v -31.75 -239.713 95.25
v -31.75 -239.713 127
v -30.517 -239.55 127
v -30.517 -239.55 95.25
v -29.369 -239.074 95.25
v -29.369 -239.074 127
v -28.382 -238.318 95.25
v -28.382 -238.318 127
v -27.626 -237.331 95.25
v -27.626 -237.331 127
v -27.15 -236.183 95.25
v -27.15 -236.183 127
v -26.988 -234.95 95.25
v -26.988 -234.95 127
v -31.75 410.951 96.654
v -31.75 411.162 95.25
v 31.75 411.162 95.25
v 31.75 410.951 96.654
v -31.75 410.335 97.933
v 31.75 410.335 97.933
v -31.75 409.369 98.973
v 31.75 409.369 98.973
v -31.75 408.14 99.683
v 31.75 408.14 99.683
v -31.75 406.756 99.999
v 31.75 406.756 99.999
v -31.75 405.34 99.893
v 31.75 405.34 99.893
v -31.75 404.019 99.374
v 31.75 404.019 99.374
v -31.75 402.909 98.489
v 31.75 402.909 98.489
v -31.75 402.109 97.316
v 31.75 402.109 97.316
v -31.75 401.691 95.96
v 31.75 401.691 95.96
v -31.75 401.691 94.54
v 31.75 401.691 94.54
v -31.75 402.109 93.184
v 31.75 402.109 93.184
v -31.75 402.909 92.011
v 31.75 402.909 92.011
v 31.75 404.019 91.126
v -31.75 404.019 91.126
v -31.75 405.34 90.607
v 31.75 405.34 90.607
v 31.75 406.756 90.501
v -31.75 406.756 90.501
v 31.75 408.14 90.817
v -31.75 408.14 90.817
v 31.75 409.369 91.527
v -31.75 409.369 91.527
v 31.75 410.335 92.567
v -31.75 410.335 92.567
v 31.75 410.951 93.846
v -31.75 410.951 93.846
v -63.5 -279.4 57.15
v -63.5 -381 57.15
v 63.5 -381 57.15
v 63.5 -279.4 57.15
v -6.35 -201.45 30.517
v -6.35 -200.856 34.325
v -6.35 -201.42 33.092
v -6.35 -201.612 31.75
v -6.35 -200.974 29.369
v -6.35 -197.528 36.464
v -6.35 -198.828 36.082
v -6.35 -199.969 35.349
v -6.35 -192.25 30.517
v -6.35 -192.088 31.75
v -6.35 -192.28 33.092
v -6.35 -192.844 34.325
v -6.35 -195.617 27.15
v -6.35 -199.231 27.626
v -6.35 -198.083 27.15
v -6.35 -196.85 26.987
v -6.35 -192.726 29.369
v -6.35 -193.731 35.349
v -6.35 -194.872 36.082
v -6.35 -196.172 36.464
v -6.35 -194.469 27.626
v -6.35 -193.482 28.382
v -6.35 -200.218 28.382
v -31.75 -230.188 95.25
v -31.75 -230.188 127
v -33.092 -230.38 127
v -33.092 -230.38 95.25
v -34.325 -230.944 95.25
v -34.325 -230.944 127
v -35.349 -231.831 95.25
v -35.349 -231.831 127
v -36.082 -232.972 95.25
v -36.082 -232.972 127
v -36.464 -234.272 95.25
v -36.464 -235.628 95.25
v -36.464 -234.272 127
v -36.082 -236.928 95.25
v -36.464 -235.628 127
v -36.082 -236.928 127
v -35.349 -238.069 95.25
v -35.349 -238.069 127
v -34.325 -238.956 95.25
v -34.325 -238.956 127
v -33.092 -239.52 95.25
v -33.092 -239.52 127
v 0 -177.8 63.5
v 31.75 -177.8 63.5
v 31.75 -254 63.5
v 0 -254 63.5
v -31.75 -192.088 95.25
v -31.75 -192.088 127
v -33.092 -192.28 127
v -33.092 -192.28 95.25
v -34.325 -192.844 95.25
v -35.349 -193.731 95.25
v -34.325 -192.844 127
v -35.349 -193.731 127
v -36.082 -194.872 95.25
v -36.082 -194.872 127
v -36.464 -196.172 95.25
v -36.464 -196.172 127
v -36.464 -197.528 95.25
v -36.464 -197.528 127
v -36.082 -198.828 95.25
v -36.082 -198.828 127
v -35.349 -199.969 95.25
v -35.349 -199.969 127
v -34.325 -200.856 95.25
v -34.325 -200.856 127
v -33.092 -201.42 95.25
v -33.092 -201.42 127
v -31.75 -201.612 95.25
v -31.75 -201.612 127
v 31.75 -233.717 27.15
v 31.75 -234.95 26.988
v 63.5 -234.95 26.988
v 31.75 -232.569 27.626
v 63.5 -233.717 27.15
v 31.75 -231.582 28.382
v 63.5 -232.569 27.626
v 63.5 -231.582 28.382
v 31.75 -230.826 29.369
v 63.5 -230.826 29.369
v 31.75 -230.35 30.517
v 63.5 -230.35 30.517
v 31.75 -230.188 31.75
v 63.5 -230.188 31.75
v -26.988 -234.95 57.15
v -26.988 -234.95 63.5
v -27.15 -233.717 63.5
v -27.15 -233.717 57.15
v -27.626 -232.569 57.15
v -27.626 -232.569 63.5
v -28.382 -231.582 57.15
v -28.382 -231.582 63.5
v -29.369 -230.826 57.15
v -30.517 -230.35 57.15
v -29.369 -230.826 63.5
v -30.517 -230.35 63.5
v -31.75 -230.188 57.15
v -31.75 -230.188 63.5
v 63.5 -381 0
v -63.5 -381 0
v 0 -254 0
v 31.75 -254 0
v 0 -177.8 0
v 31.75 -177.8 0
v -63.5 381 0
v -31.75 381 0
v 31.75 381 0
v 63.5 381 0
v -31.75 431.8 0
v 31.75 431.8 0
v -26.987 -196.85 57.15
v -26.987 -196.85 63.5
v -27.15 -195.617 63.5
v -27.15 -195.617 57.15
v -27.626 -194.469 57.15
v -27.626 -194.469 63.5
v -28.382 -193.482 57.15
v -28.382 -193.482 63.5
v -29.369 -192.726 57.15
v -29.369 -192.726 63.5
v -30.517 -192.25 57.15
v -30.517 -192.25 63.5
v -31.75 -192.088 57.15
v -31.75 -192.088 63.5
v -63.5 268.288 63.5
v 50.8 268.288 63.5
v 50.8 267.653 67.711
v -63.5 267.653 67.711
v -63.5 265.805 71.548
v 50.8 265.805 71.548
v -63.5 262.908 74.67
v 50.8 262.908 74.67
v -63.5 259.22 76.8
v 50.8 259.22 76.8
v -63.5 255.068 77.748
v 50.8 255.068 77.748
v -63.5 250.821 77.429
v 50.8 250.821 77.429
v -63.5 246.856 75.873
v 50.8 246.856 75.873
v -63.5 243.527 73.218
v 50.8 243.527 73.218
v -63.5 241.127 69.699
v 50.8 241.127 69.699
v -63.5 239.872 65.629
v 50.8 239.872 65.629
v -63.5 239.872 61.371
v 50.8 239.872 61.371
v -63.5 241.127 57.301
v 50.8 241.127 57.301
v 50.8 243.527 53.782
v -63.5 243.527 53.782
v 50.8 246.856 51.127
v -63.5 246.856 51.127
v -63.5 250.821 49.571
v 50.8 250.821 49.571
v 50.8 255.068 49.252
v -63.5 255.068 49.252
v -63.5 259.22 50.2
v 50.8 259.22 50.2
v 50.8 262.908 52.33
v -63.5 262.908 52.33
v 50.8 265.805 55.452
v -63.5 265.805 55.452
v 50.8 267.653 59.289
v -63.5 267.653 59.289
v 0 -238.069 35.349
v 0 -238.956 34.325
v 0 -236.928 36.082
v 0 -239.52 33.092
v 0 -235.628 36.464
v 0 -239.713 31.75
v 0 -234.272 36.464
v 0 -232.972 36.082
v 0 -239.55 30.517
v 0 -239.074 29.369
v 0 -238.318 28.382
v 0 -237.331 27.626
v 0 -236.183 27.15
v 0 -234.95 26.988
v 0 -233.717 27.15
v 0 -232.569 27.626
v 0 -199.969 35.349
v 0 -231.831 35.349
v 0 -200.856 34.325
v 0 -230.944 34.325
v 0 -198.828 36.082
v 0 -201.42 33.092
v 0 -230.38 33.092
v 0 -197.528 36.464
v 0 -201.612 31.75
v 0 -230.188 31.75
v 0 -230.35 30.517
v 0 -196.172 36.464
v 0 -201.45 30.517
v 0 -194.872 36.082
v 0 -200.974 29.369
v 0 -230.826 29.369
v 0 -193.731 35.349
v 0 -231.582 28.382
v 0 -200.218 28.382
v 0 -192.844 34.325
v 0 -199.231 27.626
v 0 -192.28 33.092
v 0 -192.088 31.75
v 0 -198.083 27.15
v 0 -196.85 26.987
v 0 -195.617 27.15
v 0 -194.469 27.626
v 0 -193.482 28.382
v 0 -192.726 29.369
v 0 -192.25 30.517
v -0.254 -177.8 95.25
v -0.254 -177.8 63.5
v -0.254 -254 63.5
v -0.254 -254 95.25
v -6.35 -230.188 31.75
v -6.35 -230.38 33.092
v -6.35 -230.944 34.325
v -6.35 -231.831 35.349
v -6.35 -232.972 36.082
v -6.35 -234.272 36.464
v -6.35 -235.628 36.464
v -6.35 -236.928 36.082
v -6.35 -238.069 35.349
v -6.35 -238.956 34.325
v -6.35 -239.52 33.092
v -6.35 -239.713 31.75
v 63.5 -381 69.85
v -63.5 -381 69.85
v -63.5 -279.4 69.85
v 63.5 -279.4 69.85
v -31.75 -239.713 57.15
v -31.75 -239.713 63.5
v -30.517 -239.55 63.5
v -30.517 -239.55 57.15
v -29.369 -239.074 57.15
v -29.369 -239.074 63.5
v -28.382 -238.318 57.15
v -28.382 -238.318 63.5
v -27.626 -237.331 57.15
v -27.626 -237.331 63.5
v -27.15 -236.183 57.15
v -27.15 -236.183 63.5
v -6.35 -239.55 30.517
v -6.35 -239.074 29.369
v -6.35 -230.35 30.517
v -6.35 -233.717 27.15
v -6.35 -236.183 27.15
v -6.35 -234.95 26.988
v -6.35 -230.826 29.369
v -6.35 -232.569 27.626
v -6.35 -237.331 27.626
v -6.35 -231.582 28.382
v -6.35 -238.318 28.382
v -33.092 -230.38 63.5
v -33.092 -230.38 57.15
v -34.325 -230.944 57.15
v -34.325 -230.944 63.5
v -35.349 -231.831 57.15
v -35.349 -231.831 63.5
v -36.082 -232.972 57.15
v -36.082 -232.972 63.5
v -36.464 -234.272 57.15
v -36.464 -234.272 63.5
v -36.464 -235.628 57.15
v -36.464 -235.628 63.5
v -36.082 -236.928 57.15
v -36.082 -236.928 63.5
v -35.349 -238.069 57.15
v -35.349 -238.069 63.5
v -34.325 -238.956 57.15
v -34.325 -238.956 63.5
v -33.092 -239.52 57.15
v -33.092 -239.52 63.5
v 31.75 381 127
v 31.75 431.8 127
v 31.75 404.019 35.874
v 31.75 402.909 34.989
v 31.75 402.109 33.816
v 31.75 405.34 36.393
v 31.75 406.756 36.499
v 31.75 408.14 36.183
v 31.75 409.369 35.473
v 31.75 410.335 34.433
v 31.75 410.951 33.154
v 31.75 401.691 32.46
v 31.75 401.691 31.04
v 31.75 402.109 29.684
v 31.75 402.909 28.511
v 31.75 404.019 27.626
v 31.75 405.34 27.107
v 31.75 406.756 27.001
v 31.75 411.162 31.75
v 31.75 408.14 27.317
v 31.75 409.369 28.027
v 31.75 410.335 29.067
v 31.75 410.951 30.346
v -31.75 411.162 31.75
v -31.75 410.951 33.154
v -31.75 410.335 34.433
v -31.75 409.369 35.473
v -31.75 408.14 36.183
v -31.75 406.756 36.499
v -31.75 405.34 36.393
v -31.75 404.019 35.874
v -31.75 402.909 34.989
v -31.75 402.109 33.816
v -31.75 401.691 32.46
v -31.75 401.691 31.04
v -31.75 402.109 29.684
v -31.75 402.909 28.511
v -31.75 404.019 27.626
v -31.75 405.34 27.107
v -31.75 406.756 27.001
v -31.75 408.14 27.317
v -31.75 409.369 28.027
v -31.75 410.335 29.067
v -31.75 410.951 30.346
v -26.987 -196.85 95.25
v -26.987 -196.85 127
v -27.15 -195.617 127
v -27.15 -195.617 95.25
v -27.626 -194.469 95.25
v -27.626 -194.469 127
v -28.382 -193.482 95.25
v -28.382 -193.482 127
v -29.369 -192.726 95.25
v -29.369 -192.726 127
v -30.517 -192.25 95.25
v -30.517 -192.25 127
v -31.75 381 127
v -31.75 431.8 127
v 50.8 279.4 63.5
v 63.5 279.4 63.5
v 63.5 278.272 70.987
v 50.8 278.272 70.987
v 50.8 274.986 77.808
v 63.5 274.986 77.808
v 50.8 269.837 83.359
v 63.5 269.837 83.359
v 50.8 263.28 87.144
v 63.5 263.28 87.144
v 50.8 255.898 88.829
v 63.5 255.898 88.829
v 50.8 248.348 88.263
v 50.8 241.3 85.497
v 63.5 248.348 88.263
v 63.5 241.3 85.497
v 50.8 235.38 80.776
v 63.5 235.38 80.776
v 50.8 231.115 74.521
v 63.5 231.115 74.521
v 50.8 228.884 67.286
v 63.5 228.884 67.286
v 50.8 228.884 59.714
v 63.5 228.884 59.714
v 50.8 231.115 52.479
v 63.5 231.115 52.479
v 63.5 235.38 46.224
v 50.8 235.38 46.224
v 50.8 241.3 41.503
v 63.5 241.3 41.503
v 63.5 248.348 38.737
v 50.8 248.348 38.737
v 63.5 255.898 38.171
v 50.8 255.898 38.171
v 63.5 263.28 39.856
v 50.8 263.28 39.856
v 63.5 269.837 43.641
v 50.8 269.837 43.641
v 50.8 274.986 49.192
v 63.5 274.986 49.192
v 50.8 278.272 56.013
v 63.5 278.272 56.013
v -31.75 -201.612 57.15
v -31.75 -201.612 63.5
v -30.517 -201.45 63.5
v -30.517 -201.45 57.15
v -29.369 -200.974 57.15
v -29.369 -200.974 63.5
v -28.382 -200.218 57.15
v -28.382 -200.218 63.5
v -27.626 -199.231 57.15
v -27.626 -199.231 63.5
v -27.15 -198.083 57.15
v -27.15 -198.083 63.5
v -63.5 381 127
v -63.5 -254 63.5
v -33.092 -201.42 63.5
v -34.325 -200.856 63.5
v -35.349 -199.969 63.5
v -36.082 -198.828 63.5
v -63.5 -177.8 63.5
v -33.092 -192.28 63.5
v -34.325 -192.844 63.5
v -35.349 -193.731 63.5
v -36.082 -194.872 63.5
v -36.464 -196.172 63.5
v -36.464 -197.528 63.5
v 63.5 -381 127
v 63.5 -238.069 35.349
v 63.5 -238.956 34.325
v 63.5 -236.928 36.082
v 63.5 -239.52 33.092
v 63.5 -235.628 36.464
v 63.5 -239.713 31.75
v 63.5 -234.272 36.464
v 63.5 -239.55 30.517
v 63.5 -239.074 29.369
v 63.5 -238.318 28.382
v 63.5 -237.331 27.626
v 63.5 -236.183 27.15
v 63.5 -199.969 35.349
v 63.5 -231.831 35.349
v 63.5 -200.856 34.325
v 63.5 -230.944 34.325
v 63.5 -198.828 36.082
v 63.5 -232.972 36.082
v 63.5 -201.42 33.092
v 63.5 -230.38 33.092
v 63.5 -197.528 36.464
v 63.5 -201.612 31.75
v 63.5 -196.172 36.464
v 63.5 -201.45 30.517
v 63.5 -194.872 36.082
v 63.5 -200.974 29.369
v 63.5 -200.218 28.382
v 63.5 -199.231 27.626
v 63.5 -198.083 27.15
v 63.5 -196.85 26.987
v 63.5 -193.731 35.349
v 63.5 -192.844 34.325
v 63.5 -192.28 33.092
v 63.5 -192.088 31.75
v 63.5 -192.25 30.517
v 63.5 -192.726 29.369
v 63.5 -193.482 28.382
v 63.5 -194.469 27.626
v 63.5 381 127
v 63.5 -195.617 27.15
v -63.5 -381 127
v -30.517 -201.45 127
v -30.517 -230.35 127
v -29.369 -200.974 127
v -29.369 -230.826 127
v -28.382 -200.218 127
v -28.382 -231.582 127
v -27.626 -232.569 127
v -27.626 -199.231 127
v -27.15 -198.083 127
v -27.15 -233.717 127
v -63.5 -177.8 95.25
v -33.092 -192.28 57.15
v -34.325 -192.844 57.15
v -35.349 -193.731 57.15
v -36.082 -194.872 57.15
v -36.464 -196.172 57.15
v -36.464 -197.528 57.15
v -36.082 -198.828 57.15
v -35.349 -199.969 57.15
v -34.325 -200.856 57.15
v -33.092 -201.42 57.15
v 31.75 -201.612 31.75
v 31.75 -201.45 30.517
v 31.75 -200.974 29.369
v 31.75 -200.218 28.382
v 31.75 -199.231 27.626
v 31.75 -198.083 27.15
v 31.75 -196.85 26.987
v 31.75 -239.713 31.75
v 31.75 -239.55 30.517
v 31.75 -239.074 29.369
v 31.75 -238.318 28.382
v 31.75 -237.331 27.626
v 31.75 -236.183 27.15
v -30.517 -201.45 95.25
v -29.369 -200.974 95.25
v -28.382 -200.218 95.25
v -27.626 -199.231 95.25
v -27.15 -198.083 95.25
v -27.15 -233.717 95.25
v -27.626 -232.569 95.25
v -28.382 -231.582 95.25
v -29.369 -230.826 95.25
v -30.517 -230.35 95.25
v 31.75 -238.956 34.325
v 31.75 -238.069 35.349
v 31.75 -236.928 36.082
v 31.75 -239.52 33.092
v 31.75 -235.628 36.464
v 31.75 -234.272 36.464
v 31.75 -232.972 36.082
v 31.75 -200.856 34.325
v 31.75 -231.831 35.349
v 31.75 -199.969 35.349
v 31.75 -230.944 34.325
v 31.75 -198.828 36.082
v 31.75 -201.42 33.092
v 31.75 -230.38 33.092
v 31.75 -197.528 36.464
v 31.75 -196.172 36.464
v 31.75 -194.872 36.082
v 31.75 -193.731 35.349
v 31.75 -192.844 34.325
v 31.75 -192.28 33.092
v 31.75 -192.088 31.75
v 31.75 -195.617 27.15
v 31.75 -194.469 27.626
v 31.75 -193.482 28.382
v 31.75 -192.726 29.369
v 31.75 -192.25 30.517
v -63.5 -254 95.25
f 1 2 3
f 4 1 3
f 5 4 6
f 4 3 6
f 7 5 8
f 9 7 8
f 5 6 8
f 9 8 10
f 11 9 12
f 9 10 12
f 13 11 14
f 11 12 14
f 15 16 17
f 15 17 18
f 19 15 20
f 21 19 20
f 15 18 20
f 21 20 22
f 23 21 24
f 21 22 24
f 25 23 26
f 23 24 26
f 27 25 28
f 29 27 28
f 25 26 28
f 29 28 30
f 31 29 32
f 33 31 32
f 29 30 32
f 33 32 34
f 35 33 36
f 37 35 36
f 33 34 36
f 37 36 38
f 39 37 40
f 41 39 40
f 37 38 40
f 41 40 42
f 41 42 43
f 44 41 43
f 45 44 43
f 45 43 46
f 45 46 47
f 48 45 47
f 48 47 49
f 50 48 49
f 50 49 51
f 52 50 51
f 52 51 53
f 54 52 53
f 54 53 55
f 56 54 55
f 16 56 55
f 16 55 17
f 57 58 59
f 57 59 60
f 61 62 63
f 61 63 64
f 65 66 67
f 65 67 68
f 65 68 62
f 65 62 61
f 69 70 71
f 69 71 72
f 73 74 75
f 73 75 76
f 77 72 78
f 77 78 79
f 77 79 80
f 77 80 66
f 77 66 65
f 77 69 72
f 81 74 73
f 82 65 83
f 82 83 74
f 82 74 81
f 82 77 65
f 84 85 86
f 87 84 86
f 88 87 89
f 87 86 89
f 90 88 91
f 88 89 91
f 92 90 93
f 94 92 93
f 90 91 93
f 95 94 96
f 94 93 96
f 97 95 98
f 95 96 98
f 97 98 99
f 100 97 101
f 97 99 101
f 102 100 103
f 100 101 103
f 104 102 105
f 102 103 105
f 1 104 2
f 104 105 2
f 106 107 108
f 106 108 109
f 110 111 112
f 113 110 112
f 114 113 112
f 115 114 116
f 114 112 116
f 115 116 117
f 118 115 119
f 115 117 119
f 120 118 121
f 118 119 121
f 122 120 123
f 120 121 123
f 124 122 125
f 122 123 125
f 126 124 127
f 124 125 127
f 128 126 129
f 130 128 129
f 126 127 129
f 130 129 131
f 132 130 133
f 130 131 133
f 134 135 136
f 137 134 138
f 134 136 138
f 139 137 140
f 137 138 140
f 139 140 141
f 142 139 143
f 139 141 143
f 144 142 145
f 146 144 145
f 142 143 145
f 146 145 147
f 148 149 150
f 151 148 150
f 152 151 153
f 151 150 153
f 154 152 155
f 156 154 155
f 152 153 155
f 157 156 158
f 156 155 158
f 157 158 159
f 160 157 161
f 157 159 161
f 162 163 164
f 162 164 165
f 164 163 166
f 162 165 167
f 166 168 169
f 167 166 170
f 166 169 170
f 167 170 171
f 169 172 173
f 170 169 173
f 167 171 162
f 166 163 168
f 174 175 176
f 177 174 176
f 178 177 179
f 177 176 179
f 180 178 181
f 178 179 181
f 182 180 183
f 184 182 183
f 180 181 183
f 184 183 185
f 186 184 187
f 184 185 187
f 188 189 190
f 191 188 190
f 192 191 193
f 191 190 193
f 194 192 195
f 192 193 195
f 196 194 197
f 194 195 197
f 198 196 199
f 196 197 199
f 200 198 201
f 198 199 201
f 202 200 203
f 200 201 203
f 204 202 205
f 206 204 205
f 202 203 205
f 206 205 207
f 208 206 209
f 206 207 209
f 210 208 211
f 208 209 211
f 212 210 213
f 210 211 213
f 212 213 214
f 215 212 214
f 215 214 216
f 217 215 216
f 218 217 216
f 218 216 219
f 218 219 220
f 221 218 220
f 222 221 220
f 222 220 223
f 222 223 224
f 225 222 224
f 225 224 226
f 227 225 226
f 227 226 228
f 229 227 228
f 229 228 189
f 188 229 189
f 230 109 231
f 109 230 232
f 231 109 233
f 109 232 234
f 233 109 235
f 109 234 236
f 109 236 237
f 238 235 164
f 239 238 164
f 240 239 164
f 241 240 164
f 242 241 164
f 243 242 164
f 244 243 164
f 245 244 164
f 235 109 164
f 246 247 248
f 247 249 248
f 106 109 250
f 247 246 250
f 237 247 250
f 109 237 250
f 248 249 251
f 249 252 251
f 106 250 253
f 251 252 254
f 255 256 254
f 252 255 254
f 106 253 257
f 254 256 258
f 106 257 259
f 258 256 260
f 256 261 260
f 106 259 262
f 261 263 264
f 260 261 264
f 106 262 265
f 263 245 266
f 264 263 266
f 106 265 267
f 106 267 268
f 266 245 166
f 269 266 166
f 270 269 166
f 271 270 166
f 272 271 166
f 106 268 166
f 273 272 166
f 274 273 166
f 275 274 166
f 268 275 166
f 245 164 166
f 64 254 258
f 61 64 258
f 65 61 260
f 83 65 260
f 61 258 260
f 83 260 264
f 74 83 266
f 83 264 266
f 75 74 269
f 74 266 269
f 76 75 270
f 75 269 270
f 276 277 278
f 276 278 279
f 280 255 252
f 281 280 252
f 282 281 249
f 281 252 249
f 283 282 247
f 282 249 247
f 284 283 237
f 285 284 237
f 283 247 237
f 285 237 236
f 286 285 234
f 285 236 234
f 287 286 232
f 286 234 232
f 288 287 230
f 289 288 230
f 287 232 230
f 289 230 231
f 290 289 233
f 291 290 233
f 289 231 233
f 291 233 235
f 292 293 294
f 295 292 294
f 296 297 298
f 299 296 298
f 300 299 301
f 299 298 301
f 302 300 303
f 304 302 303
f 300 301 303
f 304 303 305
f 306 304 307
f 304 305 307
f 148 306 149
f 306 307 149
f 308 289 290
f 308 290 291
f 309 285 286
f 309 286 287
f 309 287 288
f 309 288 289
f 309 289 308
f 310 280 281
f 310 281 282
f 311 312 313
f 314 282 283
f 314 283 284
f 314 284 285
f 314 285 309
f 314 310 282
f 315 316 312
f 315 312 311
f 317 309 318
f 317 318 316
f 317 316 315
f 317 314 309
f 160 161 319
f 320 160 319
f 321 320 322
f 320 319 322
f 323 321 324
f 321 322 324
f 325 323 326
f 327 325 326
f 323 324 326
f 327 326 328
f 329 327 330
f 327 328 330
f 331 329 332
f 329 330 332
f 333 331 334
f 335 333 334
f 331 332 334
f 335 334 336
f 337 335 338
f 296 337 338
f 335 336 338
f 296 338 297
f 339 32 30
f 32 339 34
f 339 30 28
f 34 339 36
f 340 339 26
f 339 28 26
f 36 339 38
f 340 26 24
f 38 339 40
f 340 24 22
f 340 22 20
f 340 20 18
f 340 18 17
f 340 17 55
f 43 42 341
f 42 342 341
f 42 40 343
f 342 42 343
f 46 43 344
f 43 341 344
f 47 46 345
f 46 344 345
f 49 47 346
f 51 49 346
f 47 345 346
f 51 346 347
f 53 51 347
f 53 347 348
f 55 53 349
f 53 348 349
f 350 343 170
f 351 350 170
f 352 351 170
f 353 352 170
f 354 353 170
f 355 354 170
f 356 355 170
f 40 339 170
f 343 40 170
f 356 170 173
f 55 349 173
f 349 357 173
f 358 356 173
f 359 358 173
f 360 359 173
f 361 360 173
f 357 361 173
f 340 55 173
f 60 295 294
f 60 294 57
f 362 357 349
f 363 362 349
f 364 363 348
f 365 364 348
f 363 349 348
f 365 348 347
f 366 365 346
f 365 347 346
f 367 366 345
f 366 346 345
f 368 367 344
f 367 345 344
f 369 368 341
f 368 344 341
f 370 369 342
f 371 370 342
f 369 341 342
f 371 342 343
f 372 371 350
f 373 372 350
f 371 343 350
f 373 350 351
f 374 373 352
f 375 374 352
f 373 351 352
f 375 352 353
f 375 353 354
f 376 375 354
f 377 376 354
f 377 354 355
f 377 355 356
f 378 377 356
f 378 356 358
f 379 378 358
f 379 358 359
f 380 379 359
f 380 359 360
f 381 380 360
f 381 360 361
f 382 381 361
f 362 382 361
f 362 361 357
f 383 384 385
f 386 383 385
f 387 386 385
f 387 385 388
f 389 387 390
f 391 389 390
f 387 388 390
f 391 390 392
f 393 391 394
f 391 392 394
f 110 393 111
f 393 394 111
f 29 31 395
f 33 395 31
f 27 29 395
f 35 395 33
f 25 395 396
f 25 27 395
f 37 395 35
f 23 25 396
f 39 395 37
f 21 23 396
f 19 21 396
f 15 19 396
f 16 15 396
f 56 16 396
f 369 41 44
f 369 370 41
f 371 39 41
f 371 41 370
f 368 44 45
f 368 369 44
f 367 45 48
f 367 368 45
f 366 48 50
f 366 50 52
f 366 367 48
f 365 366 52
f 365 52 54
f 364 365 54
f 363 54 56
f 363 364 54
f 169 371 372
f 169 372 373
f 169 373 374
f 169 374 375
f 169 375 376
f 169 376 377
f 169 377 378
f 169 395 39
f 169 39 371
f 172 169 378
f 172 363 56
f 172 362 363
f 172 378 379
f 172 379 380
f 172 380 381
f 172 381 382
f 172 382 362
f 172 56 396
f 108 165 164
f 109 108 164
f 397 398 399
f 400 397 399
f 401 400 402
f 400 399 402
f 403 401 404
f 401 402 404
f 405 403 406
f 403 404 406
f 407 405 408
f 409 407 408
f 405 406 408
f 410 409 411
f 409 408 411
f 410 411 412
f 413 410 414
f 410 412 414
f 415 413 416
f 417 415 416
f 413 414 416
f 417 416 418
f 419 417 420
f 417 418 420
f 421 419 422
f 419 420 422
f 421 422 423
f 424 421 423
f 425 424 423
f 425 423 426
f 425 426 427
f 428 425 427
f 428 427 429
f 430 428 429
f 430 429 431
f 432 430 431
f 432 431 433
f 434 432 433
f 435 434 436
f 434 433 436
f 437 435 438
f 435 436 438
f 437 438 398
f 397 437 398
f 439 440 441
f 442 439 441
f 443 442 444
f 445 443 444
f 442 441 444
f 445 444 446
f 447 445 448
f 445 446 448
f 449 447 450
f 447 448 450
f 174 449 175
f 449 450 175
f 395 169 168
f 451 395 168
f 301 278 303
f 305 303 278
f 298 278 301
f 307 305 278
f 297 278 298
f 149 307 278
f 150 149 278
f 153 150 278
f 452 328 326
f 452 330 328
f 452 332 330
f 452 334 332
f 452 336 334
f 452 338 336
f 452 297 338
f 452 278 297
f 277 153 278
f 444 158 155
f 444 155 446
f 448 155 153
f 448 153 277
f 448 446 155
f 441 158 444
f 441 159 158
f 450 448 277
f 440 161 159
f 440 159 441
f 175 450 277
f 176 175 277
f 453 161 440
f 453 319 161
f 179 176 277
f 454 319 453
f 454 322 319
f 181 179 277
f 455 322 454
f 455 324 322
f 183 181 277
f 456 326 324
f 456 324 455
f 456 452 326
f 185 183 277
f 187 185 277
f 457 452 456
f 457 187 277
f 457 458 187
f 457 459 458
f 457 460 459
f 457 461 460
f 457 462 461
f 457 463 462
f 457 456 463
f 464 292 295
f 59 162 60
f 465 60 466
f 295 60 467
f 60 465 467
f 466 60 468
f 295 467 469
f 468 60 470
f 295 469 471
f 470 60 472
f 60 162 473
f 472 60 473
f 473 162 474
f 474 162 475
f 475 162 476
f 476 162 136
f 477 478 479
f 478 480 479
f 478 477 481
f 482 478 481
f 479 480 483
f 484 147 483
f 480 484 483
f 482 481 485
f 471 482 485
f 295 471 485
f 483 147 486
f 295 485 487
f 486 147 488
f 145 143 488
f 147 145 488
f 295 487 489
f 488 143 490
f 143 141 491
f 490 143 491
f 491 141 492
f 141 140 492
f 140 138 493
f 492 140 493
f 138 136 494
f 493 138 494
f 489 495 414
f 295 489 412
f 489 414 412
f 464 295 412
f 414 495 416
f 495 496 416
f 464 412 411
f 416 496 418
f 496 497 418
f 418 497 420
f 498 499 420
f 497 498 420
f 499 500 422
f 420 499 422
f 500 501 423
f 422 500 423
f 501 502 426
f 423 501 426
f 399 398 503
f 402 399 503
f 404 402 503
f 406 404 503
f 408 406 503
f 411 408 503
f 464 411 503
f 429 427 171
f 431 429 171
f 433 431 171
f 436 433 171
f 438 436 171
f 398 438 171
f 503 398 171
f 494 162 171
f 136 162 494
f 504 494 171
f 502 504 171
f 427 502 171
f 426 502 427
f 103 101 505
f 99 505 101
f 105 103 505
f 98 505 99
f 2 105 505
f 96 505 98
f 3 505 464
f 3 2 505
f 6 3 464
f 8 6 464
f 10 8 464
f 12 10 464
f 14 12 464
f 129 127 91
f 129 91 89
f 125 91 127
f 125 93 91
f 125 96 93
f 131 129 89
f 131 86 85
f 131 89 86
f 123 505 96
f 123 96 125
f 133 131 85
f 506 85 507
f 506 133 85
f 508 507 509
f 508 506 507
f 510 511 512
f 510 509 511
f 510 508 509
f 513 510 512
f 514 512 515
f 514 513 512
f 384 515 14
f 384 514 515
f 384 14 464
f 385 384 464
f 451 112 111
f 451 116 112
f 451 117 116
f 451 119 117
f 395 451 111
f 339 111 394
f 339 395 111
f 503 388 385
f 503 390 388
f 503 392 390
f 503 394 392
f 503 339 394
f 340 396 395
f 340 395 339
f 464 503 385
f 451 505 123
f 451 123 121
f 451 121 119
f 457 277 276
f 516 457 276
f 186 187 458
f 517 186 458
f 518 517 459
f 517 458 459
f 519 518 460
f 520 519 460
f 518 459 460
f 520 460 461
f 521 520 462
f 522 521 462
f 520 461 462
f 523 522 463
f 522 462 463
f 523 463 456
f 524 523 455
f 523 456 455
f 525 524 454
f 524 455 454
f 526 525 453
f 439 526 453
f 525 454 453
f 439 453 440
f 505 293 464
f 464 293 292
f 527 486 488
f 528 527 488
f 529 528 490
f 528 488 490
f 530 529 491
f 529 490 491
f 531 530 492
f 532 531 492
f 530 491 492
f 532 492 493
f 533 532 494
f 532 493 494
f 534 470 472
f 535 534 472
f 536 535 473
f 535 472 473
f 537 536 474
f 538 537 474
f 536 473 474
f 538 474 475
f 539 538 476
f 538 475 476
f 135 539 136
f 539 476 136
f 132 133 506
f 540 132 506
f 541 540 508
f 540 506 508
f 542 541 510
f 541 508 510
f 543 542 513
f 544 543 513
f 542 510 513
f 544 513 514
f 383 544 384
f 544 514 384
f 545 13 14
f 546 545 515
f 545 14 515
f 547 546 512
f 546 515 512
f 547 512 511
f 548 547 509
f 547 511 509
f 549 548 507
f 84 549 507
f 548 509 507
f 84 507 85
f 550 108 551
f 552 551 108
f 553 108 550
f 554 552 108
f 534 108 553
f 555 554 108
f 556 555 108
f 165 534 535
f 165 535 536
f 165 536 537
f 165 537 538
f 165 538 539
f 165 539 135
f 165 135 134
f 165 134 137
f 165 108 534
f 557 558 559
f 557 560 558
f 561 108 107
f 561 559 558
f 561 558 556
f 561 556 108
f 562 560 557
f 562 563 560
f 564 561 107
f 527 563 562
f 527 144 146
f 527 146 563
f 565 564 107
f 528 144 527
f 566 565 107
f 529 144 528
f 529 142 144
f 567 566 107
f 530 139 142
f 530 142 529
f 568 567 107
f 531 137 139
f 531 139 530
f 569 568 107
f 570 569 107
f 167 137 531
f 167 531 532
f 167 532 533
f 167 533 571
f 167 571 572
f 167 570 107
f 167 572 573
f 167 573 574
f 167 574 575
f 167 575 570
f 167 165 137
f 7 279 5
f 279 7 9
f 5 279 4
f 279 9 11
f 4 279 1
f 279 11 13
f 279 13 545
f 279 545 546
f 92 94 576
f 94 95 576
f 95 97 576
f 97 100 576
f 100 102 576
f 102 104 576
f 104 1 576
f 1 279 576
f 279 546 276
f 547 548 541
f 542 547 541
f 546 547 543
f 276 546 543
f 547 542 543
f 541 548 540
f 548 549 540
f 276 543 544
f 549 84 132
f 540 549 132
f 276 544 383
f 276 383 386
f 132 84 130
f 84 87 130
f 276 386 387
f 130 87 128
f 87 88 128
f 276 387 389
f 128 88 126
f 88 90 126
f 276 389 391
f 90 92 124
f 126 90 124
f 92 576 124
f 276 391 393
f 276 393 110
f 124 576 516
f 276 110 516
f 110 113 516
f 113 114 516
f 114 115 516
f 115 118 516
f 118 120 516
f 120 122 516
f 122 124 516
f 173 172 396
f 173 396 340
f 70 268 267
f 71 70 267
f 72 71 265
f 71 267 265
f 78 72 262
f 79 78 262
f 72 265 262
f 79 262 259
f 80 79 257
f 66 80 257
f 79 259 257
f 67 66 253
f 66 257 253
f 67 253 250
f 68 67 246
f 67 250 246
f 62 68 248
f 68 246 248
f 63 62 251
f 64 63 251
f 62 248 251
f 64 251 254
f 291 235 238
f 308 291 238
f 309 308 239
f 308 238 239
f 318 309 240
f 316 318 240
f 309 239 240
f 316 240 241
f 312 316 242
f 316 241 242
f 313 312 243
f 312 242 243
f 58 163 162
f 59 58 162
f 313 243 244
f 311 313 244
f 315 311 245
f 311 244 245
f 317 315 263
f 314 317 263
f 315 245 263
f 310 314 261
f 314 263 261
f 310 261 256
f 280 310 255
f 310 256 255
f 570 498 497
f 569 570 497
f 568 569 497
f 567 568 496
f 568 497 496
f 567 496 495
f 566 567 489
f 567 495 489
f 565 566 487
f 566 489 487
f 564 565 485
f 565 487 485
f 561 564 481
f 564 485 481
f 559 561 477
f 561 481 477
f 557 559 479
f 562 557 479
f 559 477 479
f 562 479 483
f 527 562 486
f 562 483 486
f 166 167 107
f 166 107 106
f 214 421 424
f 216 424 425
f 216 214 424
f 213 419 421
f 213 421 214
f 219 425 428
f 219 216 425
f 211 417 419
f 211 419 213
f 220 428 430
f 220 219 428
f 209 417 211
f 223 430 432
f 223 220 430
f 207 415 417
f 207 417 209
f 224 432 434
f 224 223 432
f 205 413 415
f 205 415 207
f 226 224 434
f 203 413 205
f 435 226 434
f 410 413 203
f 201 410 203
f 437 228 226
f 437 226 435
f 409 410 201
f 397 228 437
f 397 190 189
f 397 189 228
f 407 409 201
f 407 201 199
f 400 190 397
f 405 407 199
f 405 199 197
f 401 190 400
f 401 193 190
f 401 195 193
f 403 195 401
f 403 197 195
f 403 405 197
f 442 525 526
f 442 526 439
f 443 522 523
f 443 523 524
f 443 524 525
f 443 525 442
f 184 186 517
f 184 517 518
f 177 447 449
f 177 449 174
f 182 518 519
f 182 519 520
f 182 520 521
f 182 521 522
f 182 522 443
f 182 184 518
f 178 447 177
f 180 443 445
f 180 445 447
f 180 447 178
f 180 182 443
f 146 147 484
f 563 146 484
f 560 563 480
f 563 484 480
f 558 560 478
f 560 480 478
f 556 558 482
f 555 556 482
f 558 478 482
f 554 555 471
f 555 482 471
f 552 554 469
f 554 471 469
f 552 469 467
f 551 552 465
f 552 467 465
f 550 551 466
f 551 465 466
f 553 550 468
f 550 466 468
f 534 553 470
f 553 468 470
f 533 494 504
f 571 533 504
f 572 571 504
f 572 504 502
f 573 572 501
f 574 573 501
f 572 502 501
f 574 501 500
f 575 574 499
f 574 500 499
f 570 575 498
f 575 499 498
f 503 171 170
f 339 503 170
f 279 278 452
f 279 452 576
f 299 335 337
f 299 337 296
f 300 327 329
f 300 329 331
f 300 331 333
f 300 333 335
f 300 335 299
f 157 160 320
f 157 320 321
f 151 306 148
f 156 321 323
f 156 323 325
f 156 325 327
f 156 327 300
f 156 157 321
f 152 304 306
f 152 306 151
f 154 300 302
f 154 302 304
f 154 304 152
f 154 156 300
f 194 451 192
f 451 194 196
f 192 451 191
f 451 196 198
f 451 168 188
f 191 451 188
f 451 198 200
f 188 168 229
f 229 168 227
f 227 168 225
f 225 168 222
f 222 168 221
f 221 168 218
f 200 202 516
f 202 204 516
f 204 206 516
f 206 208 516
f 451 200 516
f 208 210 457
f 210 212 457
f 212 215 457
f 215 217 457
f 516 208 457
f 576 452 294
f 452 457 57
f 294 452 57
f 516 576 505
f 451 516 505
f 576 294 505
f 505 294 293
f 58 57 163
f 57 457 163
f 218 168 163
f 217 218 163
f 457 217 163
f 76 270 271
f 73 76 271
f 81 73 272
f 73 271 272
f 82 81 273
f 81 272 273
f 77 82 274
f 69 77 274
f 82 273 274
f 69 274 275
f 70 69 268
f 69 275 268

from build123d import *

# Parameters (mm, degrees)
BOSS_EXTRUDE1_DEPTH = 127
SKETCH2_W           = 12.7
SKETCH2_H           = 101.6
SKETCH2_R           = 14.2875
SKETCH2_R_2         = 4.7625
CUT_EXTRUDE1_DEPTH  = 468.663597044
SKETCH3_W           = 31.75
SKETCH3_H           = 76.2
CUT_EXTRUDE2_DEPTH  = 63.5
SKETCH2_3_R         = 25.4
SKETCH2_3_R_2       = 14.2875
CUT_EXTRUDE3_DEPTH  = 12.7
SKETCH4_R           = 4.7625
CUT_EXTRUDE4_DEPTH  = 69.85
SKETCH5_W           = 31.75
SKETCH5_H           = 76.2
CUT_EXTRUDE6_DEPTH  = 63.246
SKETCH6_R           = 4.7625
CUT_EXTRUDE7_DEPTH  = 69.85


with BuildPart() as part:
    # Sketch1 → Boss-Extrude1 (new body)
    with BuildSketch(Plane.XY):
        Polygon((63.5, -381), (63.5, 381), (31.75, 381), (31.75, 431.8), (-31.75, 431.8), (-31.75, 381), (-63.5, 381), (-63.5, -381), align=None)
    extrude(amount=BOSS_EXTRUDE1_DEPTH)

    # Sketch2 → Cut-Extrude1 (cut, through all)
    with BuildSketch(Plane(origin=(63.5, 0, 0), x_dir=(0, 0, -1), z_dir=(1, 0, 0))):
        with Locations((-63.5, -330.2)):
            Rectangle(SKETCH2_W, SKETCH2_H)
        with Locations((-63.5, 254)):
            Circle(SKETCH2_R)
        with Locations((-95.25, 406.4)):
            Circle(SKETCH2_R_2)
        with Locations((-31.75, 406.4)):
            Circle(SKETCH2_R_2)
    extrude(amount=-CUT_EXTRUDE1_DEPTH, mode=Mode.SUBTRACT)

    # Sketch3 → Cut-Extrude2 (cut)
    with BuildSketch(Plane(origin=(0, 0, 0), x_dir=(-1, 0, 0), z_dir=(0, 0, -1))):
        with Locations((-15.875, -215.9)):
            Rectangle(SKETCH3_W, SKETCH3_H)
    extrude(amount=-CUT_EXTRUDE2_DEPTH, mode=Mode.SUBTRACT)

    # Sketch2<3> → Cut-Extrude3 (cut)
    with BuildSketch(Plane(origin=(63.5, 0, 0), x_dir=(0, 0, -1), z_dir=(1, 0, 0))):
        with Locations((-63.5, 254)):
            Circle(SKETCH2_3_R)
        with Locations((-63.5, 254)):
            Circle(SKETCH2_3_R_2, mode=Mode.SUBTRACT)
    extrude(amount=-CUT_EXTRUDE3_DEPTH, mode=Mode.SUBTRACT)

    # Sketch4 → Cut-Extrude4 (cut)
    with BuildSketch(Plane(origin=(63.5, 0, 0), x_dir=(0, 0, -1), z_dir=(1, 0, 0))):
        with Locations((-31.75, -196.85)):
            Circle(SKETCH4_R)
        with Locations((-31.75, -234.95)):
            Circle(SKETCH4_R)
    extrude(amount=-CUT_EXTRUDE4_DEPTH, mode=Mode.SUBTRACT)

    # Sketch5 → Cut-Extrude6 (cut)
    with BuildSketch(Plane.ZY.offset(63.5)):
        with Locations((79.375, -215.9)):
            Rectangle(SKETCH5_W, SKETCH5_H)
    extrude(amount=-CUT_EXTRUDE6_DEPTH, mode=Mode.SUBTRACT)

    # Sketch6 → Cut-Extrude7 (cut)
    with BuildSketch(Plane.XY.offset(127)):
        with Locations((-31.75, -196.85)):
            Circle(SKETCH6_R)
        with Locations((-31.75, -234.95)):
            Circle(SKETCH6_R)
    extrude(amount=-CUT_EXTRUDE7_DEPTH, mode=Mode.SUBTRACT)


solid = part.part
